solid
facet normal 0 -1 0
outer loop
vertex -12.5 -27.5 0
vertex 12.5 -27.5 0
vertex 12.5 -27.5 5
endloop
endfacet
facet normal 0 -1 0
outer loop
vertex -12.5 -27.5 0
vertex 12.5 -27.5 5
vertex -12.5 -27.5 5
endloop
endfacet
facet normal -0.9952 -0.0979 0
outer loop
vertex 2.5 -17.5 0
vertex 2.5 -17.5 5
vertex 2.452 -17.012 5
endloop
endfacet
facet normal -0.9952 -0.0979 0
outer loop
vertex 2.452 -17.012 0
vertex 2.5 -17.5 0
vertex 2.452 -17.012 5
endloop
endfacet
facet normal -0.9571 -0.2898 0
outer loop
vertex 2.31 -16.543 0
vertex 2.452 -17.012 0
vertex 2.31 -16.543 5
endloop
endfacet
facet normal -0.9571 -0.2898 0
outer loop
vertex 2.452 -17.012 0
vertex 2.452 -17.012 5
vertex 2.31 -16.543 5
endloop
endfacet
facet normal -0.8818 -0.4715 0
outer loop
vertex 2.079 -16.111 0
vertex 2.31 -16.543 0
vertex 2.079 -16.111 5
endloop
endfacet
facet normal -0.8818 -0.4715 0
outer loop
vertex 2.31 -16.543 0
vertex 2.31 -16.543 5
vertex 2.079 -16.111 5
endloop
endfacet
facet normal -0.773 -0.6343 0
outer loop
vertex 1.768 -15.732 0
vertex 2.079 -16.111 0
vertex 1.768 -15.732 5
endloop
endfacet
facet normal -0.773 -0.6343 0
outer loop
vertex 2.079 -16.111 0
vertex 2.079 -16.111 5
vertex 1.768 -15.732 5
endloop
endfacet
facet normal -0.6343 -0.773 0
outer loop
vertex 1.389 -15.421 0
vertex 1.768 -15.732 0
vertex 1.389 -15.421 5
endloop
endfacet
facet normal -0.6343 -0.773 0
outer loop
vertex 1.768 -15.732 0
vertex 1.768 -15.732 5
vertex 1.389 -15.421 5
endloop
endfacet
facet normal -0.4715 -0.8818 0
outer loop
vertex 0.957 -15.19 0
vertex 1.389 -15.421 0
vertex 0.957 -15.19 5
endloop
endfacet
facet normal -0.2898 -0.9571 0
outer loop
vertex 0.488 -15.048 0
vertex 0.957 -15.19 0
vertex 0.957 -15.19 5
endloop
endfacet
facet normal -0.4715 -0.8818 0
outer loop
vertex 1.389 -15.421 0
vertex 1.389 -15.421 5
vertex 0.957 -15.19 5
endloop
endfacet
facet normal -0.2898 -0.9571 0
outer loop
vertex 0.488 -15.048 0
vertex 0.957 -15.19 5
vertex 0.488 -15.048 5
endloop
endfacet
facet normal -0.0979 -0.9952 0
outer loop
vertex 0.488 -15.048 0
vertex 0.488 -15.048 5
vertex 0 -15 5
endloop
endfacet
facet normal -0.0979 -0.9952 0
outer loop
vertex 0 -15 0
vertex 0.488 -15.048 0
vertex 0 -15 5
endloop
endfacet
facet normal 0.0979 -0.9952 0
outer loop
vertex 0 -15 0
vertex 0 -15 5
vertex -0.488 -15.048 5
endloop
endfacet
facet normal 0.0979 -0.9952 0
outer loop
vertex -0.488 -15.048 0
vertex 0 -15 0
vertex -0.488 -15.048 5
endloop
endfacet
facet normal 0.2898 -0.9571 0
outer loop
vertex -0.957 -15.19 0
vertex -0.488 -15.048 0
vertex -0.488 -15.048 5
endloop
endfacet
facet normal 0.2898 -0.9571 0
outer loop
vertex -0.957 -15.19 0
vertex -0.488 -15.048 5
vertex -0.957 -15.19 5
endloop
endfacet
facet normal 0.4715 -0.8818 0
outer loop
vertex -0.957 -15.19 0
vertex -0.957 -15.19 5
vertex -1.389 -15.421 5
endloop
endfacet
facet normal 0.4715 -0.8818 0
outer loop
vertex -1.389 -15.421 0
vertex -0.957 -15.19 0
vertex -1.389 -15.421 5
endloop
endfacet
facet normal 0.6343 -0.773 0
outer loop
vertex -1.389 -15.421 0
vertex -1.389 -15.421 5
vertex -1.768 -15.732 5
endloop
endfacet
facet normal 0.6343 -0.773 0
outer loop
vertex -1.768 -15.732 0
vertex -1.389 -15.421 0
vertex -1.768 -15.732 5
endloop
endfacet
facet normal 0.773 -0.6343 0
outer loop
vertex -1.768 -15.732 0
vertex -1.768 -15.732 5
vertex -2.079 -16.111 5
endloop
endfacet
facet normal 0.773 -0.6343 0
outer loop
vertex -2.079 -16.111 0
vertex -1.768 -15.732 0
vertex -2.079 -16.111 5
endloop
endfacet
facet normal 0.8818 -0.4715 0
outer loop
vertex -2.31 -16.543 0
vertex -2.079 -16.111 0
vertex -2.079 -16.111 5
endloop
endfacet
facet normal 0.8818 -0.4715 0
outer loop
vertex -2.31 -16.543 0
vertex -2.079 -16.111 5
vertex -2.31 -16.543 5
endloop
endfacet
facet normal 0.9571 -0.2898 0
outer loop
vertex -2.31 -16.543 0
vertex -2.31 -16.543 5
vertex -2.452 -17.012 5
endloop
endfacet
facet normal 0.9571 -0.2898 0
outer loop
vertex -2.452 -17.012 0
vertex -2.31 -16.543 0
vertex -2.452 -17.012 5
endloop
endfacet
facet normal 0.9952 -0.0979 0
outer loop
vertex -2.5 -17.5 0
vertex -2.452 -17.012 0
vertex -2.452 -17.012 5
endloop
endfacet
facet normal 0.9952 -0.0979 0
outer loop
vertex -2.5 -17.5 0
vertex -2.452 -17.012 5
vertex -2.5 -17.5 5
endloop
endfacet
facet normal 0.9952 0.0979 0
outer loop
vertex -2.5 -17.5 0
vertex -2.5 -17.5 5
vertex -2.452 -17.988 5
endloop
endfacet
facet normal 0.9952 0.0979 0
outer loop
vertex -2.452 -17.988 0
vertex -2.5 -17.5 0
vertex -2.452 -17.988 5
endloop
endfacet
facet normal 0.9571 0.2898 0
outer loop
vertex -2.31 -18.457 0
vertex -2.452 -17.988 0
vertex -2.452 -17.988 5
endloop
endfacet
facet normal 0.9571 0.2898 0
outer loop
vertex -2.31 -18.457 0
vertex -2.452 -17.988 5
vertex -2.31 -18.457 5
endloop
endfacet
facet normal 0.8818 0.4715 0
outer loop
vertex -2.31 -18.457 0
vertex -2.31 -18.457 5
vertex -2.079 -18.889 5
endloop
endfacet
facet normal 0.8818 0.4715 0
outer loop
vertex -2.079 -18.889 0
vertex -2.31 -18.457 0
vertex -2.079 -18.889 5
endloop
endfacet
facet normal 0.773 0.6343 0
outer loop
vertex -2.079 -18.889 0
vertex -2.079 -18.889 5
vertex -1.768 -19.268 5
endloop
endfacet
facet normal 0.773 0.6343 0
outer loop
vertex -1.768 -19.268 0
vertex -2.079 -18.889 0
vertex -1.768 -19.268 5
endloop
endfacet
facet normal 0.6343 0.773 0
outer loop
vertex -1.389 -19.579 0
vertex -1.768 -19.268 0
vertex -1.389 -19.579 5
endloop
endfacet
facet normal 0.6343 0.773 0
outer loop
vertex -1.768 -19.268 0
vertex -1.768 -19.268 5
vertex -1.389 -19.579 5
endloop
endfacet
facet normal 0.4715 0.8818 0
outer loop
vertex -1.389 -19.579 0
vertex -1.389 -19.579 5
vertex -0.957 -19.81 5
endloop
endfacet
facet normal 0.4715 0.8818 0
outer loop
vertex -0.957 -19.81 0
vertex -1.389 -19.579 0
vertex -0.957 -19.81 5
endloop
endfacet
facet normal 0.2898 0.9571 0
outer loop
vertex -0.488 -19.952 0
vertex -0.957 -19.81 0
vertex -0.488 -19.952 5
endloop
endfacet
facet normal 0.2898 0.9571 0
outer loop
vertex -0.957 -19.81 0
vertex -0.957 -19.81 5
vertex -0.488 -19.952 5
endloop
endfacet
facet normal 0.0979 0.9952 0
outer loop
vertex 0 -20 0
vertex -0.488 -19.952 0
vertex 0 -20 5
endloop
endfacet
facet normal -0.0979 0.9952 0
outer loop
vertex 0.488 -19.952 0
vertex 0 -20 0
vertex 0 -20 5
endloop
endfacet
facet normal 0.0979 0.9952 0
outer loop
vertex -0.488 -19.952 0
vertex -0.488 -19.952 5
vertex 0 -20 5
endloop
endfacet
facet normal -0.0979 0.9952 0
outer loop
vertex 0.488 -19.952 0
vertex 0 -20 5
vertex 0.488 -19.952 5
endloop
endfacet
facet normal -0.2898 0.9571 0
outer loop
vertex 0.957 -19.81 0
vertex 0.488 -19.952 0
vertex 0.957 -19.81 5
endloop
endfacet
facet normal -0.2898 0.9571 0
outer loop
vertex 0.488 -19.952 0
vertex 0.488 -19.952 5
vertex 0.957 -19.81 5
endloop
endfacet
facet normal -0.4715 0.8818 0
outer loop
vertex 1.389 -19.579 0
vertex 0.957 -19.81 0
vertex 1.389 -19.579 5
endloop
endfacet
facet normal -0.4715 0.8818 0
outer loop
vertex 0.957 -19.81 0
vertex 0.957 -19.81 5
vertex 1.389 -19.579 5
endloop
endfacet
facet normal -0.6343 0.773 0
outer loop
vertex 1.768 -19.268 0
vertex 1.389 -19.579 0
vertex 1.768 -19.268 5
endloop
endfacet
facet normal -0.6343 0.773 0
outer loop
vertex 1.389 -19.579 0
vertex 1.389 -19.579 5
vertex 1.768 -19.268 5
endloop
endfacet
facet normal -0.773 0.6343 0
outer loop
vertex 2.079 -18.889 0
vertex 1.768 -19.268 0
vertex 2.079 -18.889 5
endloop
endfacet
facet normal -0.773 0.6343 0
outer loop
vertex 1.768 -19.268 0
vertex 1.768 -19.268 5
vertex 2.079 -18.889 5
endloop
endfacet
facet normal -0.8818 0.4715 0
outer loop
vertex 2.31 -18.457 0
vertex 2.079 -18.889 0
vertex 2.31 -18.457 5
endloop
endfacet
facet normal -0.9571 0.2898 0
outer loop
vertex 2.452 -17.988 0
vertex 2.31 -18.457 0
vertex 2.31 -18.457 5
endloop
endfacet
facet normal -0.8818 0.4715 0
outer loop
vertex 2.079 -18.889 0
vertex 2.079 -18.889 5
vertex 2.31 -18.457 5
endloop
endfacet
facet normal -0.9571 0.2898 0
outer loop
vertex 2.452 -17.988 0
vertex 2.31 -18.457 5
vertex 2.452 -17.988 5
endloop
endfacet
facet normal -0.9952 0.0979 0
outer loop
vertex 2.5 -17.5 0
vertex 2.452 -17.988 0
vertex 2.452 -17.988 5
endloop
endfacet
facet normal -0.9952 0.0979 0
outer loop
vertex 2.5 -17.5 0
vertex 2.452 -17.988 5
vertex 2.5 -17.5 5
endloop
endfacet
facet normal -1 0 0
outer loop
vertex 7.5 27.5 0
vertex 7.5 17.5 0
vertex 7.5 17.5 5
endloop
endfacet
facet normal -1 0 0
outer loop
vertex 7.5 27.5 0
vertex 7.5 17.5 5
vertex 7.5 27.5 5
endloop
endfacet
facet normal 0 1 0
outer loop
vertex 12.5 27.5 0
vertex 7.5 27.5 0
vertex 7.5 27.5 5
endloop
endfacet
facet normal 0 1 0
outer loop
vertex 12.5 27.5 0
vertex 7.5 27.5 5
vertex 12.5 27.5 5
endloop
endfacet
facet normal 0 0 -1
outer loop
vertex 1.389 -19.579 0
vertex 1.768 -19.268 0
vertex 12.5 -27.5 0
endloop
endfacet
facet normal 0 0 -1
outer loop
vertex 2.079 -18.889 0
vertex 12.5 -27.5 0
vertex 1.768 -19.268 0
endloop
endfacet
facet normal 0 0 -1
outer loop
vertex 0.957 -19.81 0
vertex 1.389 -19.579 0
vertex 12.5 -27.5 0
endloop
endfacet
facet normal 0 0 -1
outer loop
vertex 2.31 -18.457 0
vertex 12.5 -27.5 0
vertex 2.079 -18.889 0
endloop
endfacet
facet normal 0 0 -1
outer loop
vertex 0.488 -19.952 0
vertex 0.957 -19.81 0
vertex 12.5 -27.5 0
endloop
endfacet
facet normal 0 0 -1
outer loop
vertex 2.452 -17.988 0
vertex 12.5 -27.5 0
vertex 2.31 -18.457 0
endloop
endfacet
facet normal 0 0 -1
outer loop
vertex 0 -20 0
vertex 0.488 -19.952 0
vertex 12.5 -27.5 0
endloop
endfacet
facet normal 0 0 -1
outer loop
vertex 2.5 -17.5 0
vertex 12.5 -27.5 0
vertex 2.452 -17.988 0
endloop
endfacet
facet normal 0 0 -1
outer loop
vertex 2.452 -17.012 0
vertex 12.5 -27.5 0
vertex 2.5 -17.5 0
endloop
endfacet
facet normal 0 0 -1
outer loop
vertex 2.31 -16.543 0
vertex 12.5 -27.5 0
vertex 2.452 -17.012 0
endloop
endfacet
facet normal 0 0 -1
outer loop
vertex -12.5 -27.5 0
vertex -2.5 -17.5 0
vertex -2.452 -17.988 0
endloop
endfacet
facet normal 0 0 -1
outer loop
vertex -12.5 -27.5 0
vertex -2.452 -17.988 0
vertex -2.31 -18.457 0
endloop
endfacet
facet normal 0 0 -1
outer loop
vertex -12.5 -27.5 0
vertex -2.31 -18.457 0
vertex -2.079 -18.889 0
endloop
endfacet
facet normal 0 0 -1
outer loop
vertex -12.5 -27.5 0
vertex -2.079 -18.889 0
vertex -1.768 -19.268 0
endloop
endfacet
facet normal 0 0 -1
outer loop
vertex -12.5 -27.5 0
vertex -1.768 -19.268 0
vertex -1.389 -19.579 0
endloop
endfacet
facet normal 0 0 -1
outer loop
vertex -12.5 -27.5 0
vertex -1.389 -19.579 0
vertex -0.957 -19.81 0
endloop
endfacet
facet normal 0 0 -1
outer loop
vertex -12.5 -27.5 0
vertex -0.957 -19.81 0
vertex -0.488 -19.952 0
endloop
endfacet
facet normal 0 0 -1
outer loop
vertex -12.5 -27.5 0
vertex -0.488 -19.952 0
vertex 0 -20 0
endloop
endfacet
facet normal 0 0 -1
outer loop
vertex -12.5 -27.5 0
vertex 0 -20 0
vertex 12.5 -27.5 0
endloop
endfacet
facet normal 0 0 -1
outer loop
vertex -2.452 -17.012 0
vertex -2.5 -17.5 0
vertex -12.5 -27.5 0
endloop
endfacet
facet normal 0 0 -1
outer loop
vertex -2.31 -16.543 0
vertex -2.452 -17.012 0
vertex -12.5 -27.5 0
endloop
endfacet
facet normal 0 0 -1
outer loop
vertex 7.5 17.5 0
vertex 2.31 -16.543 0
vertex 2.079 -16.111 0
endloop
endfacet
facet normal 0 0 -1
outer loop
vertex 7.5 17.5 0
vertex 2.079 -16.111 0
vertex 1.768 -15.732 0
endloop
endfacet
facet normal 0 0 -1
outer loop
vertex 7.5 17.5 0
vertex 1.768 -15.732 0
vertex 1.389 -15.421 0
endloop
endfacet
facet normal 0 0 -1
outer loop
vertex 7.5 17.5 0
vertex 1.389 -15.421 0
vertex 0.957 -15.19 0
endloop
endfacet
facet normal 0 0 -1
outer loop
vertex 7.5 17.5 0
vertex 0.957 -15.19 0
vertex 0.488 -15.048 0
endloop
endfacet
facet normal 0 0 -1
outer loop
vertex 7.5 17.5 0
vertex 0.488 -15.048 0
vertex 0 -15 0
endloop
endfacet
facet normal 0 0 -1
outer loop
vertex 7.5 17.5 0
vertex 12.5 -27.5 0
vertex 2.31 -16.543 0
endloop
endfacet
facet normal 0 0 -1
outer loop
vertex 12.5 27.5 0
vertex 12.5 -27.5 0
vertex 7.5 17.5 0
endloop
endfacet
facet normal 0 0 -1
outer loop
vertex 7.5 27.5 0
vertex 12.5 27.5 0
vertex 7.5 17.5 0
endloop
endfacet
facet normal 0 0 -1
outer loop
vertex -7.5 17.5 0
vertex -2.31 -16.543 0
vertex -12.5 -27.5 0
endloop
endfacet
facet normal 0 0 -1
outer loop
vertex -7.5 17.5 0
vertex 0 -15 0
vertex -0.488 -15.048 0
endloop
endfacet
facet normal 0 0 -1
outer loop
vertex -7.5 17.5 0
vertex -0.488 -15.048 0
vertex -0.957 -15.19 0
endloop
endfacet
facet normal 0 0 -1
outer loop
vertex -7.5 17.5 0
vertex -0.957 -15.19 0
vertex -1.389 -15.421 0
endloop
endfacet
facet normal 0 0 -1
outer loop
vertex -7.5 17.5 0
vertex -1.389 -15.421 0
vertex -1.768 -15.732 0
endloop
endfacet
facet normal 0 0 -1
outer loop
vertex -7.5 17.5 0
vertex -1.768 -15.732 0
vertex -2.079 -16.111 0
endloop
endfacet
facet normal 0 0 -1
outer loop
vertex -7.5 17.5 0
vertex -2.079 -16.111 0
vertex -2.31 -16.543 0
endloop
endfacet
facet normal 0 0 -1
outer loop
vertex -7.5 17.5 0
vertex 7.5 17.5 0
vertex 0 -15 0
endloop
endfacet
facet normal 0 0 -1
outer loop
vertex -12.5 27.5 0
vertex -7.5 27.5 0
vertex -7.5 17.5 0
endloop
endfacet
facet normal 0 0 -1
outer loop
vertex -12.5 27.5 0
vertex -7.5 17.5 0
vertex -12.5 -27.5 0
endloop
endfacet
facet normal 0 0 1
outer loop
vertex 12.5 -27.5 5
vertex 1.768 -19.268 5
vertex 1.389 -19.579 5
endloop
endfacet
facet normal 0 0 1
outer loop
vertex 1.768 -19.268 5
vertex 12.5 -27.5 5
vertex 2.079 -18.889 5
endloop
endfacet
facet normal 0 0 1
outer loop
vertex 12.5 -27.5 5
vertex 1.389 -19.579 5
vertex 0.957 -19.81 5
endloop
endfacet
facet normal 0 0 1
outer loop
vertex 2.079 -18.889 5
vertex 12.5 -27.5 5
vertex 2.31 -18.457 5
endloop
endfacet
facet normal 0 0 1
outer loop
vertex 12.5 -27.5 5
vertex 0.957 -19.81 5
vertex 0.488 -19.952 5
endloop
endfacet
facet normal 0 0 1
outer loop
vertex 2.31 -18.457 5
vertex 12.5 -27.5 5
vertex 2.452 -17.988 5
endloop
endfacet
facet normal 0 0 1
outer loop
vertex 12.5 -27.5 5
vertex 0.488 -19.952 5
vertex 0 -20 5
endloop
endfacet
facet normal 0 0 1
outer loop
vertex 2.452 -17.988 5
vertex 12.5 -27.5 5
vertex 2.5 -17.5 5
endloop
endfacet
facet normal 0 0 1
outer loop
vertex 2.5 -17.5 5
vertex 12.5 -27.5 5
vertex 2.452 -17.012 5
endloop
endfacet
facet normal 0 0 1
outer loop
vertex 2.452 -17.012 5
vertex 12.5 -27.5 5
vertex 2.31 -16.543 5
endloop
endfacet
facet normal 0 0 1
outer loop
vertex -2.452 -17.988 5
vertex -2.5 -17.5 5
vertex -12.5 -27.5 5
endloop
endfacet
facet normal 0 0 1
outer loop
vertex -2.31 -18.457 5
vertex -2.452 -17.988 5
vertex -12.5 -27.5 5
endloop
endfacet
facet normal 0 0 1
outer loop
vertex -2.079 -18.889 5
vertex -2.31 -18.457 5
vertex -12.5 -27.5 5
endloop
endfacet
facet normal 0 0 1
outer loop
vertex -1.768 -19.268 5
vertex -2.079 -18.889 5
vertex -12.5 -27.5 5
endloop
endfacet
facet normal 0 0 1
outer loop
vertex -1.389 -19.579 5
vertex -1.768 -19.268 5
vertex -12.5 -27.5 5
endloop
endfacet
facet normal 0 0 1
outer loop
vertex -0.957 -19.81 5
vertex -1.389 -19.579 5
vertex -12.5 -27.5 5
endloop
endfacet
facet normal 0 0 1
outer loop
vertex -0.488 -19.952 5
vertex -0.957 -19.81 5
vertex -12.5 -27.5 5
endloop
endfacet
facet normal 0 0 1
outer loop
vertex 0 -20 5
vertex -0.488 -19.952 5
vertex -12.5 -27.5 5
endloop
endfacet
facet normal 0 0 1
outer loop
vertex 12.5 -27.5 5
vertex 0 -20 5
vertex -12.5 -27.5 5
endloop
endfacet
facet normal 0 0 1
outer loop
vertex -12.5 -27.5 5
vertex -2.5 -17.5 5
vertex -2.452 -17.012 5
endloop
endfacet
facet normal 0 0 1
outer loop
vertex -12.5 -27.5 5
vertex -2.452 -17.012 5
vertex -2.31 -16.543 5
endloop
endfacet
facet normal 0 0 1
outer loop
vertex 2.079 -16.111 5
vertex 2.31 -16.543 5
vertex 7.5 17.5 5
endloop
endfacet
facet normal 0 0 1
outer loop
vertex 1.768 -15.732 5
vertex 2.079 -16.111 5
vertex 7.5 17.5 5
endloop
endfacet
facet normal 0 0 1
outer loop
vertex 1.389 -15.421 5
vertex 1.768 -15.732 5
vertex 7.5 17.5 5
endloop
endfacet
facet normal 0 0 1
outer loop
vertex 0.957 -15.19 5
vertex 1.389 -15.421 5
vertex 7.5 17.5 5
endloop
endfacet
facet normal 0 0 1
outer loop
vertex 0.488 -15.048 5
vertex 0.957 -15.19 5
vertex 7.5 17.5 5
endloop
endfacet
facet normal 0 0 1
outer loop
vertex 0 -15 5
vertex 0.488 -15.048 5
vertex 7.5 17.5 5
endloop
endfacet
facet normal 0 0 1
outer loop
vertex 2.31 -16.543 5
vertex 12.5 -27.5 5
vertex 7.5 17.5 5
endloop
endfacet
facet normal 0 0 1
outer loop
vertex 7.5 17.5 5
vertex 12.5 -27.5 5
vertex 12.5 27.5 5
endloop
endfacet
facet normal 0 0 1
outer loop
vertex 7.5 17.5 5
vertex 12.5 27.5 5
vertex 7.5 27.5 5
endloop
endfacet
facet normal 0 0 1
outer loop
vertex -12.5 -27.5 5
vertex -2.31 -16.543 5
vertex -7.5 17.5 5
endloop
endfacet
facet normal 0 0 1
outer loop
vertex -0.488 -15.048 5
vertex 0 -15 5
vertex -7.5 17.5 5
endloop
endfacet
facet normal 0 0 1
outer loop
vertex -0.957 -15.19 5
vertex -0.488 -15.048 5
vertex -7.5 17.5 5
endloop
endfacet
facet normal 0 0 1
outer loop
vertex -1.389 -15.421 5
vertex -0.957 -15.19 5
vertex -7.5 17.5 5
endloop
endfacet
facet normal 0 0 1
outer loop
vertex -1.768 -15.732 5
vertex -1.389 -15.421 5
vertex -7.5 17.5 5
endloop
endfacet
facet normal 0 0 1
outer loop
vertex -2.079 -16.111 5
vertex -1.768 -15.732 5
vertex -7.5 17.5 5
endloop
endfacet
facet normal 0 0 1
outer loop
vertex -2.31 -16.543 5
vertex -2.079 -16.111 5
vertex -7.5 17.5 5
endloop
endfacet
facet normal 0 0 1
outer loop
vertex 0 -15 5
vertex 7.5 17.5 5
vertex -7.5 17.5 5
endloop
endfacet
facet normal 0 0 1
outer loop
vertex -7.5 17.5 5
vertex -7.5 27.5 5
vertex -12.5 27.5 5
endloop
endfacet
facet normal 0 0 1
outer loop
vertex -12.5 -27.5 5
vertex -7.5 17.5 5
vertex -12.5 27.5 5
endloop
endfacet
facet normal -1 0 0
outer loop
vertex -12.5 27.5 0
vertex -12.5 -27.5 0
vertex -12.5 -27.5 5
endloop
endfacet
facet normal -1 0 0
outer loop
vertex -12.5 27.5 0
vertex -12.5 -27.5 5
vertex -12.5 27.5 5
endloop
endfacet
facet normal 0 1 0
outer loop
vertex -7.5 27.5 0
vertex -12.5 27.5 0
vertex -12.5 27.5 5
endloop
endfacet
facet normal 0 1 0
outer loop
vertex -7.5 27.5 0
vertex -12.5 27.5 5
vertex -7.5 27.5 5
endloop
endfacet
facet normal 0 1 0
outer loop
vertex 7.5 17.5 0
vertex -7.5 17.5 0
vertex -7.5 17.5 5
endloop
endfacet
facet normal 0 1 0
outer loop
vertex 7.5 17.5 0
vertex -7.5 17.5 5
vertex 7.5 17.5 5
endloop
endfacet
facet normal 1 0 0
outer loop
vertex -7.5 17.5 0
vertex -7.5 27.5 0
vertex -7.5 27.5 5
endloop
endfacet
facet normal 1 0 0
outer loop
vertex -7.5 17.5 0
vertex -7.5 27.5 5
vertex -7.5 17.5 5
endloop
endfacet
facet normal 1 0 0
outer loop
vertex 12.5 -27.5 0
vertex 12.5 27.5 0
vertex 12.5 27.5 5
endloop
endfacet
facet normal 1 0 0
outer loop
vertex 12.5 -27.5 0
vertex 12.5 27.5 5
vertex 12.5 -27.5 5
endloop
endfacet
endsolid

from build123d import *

# Parameters (mm, degrees)
BOSS_EXTRUDE1_DEPTH = 5
SKETCH2_R           = 2.5
CUT_EXTRUDE1_DEPTH  = 31.618621785


with BuildPart() as part:
    # Sketch1 → Boss-Extrude1 (new body)
    with BuildSketch(Plane.XY):
        Polygon((-7.5, 27.5), (-7.5, 17.5), (7.5, 17.5), (7.5, 27.5), (12.5, 27.5), (12.5, -27.5), (-12.5, -27.5), (-12.5, 27.5), align=None)
    extrude(amount=BOSS_EXTRUDE1_DEPTH)

    # Sketch2 → Cut-Extrude1 (cut, through all)
    with BuildSketch(Plane.XY.offset(5)):
        with Locations((0, -17.5)):
            Circle(SKETCH2_R)
    extrude(amount=-CUT_EXTRUDE1_DEPTH, mode=Mode.SUBTRACT)


solid = part.part
